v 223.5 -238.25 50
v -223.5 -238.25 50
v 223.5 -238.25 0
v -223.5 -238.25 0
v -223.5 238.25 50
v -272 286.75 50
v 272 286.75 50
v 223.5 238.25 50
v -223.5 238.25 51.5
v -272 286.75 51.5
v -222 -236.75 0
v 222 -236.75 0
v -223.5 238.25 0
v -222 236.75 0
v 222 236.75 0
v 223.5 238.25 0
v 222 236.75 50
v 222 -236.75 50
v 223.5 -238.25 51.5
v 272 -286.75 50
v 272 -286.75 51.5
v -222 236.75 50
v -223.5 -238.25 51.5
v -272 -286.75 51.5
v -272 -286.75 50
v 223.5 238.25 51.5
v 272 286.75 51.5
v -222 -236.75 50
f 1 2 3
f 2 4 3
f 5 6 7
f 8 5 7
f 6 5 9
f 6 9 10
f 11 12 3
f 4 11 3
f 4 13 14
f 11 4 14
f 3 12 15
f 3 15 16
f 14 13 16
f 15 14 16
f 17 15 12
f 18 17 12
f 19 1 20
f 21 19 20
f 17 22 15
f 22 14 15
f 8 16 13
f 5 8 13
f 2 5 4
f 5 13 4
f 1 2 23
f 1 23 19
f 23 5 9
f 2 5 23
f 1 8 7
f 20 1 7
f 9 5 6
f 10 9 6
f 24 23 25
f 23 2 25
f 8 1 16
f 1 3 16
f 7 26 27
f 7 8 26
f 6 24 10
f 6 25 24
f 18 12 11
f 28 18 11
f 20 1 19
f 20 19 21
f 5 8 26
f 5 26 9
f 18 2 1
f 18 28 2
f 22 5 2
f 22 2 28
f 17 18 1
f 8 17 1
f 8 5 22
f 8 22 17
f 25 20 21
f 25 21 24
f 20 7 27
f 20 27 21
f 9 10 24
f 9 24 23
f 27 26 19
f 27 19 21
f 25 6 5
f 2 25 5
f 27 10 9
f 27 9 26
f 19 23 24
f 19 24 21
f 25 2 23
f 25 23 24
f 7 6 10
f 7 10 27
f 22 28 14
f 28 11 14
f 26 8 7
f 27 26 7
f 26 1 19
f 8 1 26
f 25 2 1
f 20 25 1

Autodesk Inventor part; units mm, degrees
ref_plane "YZ Plane" through (0, 0, 0) normal (1, 0, 0) x (0, 1, 0)
ref_plane "XZ Plane" through (0, 0, 0) normal (0, 1, 0) x (-1, 0, 0)
ref_plane "XY Plane" through (0, 0, 0) normal (0, 0, 1) x (1, 0, 0)
sketch "Sketch1" plane through (0, 0, 0) normal (0, 0, 1) x (1, 0, 0)
  line L0 (222, -236.75) -> (-222, -236.75)
  line L1 (-222, -236.75) -> (-222, 236.75)
  line L2 (-222, 236.75) -> (222, 236.75)
  line L3 (222, 236.75) -> (222, -236.75)
  line L4 (222, -236.75) -> (-222, 236.75) construction
  line L5 (-222, -236.75) -> (222, 236.75) construction
  line L6 (223.5, 238.25) -> (-223.5, 238.25)
  line L7 (-223.5, 238.25) -> (-223.5, -238.25)
  line L8 (-223.5, -238.25) -> (223.5, -238.25)
  line L9 (223.5, -238.25) -> (223.5, 238.25)
  point P0 (0, 0)
  dimension "d0" = 444
  dimension "d1" = 473.5
  dimension "d2" = 1.5
extrude "Extrusion1" add sketch "Sketch1" along normal blind 50
sketch "Sketch2" plane through (0, 0, 50) normal (0, 0, 1) x (1, 0, 0)
  line L0 (223.5, 238.25) -> (-223.5, 238.25) projected
  line L1 (-223.5, 238.25) -> (-223.5, -238.25) projected
  line L2 (223.5, -238.25) -> (223.5, 238.25) projected
  line L3 (-223.5, -238.25) -> (223.5, -238.25) projected
  line L4 (272, -286.75) -> (-272, -286.75)
  line L5 (-272, -286.75) -> (-272, 286.75)
  line L6 (-272, 286.75) -> (272, 286.75)
  line L7 (272, 286.75) -> (272, -286.75)
  line L8 (272, -286.75) -> (-272, 286.75) construction
  line L9 (-272, -286.75) -> (272, 286.75) construction
  line L10 (-223.5, 238.25) -> (-272, 286.75)
  line L11 (-223.5, -238.25) -> (-272, -286.75)
  line L12 (223.5, -238.25) -> (272, -286.75)
  line L13 (223.5, 238.25) -> (272, 286.75)
  point P0 (0, 0)
  dimension "d5" = 544
  dimension "d6" = 573.5
extrude "Extrusion2" add sketch "Sketch2" along normal blind 1.5 separate body contours L0 L10 L6 L13
extrude "Extrusion3" add sketch "Sketch2" along normal blind 1.5 separate body contours L13 L7 L12 L2
extrude "Extrusion4" add sketch "Sketch2" along normal blind 1.5 separate body contours L1 L11 L5 L10
extrude "Extrusion5" add sketch "Sketch2" along normal blind 1.5 separate body contours L12 L4 L11 L3
sketch "Sketch3" plane through (0, 0, 0) normal (0, 0, -1) x (-1, 0, 0)
  line L0 (-223.5, 238.25) -> (223.5, 238.25) projected
  line L1 (-223.5, -238.25) -> (-223.5, 238.25) projected
  line L2 (223.5, 238.25) -> (223.5, -238.25) projected
  line L3 (223.5, -238.25) -> (-223.5, -238.25) projected
  point P0 (0, 0)
properties part number "Test Section Ver2 Frame"
